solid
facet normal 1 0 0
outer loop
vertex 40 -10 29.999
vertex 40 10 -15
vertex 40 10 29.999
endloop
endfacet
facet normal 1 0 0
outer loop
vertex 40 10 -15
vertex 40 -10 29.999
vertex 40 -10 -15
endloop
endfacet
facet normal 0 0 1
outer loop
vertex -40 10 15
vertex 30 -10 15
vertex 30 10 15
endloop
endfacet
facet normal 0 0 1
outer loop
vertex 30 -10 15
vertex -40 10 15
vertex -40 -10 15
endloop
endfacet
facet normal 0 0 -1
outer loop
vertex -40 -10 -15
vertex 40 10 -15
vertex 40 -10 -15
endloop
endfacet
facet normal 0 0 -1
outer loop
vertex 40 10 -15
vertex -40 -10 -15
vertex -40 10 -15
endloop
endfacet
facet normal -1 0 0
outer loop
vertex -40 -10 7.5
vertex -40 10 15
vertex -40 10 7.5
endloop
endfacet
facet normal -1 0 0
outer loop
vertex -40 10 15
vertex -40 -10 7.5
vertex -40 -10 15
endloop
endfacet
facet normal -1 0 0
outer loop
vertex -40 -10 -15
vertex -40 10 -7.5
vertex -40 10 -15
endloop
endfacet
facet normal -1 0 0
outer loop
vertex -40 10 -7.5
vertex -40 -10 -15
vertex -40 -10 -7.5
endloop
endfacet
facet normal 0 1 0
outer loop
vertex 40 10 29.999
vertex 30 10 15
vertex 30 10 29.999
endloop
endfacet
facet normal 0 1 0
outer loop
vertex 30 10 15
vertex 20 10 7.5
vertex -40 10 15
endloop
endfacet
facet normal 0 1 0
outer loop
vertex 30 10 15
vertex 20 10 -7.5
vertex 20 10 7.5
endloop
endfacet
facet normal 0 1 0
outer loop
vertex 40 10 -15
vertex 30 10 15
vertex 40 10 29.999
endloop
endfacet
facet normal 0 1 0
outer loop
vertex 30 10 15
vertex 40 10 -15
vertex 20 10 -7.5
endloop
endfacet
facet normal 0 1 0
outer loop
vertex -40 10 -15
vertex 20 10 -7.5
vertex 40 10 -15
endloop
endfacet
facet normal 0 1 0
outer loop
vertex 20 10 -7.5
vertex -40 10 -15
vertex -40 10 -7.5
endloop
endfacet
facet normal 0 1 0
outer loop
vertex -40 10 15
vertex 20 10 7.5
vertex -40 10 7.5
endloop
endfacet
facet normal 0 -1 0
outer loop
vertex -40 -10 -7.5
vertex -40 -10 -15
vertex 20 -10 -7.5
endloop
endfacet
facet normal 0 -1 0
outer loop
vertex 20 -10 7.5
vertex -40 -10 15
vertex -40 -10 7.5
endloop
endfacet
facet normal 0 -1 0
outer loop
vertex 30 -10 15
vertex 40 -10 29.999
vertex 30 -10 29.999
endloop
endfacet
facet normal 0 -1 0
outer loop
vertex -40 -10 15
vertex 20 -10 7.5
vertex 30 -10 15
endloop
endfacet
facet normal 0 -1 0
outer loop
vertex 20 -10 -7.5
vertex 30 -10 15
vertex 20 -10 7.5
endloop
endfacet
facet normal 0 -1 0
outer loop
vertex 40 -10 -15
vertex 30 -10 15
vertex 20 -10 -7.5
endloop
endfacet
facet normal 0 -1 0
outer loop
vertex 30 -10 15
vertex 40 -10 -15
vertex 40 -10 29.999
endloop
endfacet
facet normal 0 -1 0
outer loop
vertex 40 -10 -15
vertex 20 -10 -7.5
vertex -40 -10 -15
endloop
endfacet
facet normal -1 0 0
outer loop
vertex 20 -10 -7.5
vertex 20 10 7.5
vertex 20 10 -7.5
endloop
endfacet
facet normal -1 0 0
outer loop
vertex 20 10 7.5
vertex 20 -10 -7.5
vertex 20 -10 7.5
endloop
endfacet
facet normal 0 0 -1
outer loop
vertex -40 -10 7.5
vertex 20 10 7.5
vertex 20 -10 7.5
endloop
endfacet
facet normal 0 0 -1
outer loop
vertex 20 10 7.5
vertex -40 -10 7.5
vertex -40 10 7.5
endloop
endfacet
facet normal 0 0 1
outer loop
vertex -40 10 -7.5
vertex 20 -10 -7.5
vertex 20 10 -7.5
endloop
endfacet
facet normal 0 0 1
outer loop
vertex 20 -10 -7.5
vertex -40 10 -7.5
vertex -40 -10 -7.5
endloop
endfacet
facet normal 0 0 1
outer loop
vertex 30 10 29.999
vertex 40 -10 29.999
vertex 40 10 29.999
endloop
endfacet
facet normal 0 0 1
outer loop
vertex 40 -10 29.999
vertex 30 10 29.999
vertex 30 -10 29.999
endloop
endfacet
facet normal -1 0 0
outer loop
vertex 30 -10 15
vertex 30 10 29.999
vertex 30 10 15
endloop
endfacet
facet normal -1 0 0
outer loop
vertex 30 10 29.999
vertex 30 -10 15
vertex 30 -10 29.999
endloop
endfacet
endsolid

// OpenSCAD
difference() {
  // Outer Cube (Solid)
  cube([80,20,30],center = true);
  // Inner Cube (The part to be removed)
  // Scale it down and move it slightly inwards to create walls
  translate([-40, -10, -7.5]) // Position the inner cube
  cube([60, 20, 15]); // A slightly smaller 60x20x20 cube

}
translate([35,00,20 - 0.001])
  cube([10,20,20],center = true);
